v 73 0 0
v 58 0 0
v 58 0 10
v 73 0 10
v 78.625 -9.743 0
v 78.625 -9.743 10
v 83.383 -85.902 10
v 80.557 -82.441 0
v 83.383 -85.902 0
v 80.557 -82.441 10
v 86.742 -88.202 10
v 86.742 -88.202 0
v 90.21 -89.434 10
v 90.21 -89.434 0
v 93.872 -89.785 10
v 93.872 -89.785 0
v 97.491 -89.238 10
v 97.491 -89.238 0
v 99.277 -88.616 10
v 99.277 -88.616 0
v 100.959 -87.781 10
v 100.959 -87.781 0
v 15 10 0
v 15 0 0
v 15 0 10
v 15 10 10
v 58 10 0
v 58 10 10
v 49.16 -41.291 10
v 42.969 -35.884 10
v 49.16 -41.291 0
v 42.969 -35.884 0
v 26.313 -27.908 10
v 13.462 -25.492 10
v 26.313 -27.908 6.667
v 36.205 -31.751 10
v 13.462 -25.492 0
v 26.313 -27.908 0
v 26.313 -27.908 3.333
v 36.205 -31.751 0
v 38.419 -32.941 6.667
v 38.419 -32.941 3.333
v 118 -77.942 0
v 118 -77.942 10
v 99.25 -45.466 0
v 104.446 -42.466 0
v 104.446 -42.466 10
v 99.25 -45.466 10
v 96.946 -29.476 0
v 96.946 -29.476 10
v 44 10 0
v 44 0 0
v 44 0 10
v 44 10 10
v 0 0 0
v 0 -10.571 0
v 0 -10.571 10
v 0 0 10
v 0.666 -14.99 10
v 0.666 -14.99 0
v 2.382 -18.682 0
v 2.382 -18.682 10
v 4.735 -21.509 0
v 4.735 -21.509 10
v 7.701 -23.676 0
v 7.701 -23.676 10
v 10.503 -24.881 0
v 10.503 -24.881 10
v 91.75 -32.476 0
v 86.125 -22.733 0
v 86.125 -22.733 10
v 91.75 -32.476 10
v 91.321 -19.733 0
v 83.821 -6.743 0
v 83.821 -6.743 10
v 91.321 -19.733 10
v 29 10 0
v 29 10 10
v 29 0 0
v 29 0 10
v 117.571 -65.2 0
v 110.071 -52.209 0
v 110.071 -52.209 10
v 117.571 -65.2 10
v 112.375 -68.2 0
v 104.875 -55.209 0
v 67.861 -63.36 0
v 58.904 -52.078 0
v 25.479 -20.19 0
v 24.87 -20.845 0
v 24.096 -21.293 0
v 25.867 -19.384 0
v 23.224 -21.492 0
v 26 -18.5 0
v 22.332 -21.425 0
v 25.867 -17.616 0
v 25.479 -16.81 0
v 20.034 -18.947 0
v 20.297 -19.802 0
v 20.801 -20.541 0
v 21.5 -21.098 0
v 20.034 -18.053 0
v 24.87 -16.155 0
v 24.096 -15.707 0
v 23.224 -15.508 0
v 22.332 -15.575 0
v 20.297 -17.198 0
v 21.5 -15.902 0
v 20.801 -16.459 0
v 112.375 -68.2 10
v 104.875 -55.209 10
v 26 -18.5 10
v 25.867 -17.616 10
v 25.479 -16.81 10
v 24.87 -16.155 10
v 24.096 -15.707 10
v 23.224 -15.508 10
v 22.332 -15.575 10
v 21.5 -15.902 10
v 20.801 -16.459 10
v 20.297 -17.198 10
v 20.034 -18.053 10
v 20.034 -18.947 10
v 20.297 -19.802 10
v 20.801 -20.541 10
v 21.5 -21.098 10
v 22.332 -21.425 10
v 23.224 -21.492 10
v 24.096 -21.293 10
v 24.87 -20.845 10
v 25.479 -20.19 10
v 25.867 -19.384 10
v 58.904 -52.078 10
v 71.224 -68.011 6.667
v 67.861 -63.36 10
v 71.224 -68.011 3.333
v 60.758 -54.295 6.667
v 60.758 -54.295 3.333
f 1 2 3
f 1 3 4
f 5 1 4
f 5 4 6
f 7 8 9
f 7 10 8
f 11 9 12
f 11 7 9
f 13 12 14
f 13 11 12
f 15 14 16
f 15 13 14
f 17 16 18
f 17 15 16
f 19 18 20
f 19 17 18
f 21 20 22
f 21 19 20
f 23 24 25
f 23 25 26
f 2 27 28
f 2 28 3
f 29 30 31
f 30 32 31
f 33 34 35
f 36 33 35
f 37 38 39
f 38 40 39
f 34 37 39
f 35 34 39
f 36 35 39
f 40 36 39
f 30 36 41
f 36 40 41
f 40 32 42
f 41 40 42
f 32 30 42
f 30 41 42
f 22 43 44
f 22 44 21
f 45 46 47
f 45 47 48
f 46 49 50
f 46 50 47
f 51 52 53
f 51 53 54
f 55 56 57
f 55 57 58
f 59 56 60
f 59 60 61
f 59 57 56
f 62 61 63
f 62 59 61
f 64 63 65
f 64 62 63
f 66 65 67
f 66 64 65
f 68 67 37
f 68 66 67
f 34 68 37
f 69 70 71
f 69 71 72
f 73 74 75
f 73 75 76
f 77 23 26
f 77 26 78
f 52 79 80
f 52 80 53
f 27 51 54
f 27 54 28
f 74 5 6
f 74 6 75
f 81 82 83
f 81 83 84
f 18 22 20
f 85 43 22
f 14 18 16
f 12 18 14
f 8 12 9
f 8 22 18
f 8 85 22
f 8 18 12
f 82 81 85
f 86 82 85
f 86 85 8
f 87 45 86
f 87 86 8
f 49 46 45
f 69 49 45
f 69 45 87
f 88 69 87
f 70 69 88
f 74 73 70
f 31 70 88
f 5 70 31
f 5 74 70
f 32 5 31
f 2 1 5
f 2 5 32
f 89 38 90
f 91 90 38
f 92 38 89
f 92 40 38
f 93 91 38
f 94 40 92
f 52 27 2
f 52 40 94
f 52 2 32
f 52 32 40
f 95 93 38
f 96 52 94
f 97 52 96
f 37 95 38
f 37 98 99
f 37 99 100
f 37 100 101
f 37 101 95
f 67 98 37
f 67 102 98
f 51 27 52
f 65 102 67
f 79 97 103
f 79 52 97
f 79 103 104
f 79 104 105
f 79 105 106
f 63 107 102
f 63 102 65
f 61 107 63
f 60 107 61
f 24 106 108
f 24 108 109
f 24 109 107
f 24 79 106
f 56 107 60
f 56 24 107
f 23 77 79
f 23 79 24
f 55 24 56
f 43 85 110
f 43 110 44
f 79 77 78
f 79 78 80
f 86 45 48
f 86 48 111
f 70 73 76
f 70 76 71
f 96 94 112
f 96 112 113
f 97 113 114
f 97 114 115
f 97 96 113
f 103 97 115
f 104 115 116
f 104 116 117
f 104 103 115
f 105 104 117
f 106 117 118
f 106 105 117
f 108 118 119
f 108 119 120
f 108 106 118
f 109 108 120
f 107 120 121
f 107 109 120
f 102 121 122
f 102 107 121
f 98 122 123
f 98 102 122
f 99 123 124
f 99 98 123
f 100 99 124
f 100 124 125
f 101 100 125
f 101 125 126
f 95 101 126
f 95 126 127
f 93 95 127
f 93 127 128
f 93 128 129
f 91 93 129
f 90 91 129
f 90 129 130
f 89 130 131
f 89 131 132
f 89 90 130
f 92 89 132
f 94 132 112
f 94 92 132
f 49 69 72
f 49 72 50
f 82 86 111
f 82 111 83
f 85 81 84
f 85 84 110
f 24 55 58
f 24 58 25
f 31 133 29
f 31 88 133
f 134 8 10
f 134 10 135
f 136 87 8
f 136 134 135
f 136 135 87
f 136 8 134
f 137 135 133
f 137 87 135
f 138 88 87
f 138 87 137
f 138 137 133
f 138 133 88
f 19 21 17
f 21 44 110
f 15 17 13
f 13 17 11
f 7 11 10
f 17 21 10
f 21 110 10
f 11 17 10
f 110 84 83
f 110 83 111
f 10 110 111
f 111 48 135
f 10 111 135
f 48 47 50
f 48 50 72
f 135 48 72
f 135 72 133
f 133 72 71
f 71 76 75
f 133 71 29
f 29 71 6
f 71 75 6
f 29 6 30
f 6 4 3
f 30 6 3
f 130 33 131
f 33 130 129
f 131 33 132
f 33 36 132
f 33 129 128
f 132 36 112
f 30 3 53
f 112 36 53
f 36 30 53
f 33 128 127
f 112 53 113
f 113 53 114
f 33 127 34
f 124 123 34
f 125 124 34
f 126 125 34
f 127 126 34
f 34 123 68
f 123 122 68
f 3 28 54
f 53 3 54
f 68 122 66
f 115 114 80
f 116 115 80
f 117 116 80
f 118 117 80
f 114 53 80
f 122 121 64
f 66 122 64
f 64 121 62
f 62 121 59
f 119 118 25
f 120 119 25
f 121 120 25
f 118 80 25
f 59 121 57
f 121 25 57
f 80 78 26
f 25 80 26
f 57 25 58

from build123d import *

# Parameters (mm, degrees)
SKETCH1_R           = 3
BOSS_EXTRUDE1_DEPTH = 10
FILLET1_R           = 15


with BuildPart() as part:
    # Sketch1 → Boss-Extrude1 (new body)
    with BuildSketch(Plane.XY):
        with BuildLine():
            Line((0, 0), (15, 0))
            Line((15, 0), (15, 10))
            Line((15, 10), (29, 10))
            Line((29, 10), (29, 0))
            Line((29, 0), (44, 0))
            Line((44, 0), (44, 10))
            Line((44, 10), (58, 10))
            Line((58, 10), (58, 0))
            Line((58, 0), (73, 0))
            Line((73, 0), (78.625, -9.742785793))
            Line((78.625, -9.742785793), (83.821152423, -6.742785793))
            Line((83.821152423, -6.742785793), (91.321152423, -19.733166849))
            Line((91.321152423, -19.733166849), (86.125, -22.733166849))
            Line((86.125, -22.733166849), (91.75, -32.475952642))
            Line((91.75, -32.475952642), (96.946152423, -29.475952642))
            Line((96.946152423, -29.475952642), (104.446152423, -42.466333699))
            Line((104.446152423, -42.466333699), (99.25, -45.466333699))
            Line((99.25, -45.466333699), (104.875, -55.209119491))
            Line((104.875, -55.209119491), (110.071152423, -52.209119491))
            Line((110.071152423, -52.209119491), (117.571152423, -65.199500548))
            Line((117.571152423, -65.199500548), (112.375, -68.199500548))
            Line((112.375, -68.199500548), (118, -77.942286341))
            Line((118, -77.942286341), (87.689110868, -95.442286341))
            add(Edge.make_bspline(
                [(87.689110868, -95.442286341), (77.660181341, -75.620017272), (64.817303381, -57.569676854), (49.160476986, -41.291265088)],
                knots=[0, 0, 0, 0, 1, 1, 1, 1], degree=3))
            add(Edge.make_bspline(
                [(0, -25), (17.242534467, -24.639573707), (35.899987596, -27.504326339), (49.160476986, -41.291265088)],
                knots=[0, 0, 0, 0, 1, 1, 1, 1], degree=3))
            Line((0, -25), (0, 0))
        make_face()
        with Locations((23, -18.5)):
            Circle(SKETCH1_R, mode=Mode.SUBTRACT)
    extrude(amount=BOSS_EXTRUDE1_DEPTH)

    # Fillet1
    fillet1_edges = [part.edges().sort_by_distance(p)[0] for p in [
        (87.689110868, -95.442286341, 5),
        (0, -25, 5),
    ]]
    fillet(fillet1_edges, radius=FILLET1_R)


solid = part.part
